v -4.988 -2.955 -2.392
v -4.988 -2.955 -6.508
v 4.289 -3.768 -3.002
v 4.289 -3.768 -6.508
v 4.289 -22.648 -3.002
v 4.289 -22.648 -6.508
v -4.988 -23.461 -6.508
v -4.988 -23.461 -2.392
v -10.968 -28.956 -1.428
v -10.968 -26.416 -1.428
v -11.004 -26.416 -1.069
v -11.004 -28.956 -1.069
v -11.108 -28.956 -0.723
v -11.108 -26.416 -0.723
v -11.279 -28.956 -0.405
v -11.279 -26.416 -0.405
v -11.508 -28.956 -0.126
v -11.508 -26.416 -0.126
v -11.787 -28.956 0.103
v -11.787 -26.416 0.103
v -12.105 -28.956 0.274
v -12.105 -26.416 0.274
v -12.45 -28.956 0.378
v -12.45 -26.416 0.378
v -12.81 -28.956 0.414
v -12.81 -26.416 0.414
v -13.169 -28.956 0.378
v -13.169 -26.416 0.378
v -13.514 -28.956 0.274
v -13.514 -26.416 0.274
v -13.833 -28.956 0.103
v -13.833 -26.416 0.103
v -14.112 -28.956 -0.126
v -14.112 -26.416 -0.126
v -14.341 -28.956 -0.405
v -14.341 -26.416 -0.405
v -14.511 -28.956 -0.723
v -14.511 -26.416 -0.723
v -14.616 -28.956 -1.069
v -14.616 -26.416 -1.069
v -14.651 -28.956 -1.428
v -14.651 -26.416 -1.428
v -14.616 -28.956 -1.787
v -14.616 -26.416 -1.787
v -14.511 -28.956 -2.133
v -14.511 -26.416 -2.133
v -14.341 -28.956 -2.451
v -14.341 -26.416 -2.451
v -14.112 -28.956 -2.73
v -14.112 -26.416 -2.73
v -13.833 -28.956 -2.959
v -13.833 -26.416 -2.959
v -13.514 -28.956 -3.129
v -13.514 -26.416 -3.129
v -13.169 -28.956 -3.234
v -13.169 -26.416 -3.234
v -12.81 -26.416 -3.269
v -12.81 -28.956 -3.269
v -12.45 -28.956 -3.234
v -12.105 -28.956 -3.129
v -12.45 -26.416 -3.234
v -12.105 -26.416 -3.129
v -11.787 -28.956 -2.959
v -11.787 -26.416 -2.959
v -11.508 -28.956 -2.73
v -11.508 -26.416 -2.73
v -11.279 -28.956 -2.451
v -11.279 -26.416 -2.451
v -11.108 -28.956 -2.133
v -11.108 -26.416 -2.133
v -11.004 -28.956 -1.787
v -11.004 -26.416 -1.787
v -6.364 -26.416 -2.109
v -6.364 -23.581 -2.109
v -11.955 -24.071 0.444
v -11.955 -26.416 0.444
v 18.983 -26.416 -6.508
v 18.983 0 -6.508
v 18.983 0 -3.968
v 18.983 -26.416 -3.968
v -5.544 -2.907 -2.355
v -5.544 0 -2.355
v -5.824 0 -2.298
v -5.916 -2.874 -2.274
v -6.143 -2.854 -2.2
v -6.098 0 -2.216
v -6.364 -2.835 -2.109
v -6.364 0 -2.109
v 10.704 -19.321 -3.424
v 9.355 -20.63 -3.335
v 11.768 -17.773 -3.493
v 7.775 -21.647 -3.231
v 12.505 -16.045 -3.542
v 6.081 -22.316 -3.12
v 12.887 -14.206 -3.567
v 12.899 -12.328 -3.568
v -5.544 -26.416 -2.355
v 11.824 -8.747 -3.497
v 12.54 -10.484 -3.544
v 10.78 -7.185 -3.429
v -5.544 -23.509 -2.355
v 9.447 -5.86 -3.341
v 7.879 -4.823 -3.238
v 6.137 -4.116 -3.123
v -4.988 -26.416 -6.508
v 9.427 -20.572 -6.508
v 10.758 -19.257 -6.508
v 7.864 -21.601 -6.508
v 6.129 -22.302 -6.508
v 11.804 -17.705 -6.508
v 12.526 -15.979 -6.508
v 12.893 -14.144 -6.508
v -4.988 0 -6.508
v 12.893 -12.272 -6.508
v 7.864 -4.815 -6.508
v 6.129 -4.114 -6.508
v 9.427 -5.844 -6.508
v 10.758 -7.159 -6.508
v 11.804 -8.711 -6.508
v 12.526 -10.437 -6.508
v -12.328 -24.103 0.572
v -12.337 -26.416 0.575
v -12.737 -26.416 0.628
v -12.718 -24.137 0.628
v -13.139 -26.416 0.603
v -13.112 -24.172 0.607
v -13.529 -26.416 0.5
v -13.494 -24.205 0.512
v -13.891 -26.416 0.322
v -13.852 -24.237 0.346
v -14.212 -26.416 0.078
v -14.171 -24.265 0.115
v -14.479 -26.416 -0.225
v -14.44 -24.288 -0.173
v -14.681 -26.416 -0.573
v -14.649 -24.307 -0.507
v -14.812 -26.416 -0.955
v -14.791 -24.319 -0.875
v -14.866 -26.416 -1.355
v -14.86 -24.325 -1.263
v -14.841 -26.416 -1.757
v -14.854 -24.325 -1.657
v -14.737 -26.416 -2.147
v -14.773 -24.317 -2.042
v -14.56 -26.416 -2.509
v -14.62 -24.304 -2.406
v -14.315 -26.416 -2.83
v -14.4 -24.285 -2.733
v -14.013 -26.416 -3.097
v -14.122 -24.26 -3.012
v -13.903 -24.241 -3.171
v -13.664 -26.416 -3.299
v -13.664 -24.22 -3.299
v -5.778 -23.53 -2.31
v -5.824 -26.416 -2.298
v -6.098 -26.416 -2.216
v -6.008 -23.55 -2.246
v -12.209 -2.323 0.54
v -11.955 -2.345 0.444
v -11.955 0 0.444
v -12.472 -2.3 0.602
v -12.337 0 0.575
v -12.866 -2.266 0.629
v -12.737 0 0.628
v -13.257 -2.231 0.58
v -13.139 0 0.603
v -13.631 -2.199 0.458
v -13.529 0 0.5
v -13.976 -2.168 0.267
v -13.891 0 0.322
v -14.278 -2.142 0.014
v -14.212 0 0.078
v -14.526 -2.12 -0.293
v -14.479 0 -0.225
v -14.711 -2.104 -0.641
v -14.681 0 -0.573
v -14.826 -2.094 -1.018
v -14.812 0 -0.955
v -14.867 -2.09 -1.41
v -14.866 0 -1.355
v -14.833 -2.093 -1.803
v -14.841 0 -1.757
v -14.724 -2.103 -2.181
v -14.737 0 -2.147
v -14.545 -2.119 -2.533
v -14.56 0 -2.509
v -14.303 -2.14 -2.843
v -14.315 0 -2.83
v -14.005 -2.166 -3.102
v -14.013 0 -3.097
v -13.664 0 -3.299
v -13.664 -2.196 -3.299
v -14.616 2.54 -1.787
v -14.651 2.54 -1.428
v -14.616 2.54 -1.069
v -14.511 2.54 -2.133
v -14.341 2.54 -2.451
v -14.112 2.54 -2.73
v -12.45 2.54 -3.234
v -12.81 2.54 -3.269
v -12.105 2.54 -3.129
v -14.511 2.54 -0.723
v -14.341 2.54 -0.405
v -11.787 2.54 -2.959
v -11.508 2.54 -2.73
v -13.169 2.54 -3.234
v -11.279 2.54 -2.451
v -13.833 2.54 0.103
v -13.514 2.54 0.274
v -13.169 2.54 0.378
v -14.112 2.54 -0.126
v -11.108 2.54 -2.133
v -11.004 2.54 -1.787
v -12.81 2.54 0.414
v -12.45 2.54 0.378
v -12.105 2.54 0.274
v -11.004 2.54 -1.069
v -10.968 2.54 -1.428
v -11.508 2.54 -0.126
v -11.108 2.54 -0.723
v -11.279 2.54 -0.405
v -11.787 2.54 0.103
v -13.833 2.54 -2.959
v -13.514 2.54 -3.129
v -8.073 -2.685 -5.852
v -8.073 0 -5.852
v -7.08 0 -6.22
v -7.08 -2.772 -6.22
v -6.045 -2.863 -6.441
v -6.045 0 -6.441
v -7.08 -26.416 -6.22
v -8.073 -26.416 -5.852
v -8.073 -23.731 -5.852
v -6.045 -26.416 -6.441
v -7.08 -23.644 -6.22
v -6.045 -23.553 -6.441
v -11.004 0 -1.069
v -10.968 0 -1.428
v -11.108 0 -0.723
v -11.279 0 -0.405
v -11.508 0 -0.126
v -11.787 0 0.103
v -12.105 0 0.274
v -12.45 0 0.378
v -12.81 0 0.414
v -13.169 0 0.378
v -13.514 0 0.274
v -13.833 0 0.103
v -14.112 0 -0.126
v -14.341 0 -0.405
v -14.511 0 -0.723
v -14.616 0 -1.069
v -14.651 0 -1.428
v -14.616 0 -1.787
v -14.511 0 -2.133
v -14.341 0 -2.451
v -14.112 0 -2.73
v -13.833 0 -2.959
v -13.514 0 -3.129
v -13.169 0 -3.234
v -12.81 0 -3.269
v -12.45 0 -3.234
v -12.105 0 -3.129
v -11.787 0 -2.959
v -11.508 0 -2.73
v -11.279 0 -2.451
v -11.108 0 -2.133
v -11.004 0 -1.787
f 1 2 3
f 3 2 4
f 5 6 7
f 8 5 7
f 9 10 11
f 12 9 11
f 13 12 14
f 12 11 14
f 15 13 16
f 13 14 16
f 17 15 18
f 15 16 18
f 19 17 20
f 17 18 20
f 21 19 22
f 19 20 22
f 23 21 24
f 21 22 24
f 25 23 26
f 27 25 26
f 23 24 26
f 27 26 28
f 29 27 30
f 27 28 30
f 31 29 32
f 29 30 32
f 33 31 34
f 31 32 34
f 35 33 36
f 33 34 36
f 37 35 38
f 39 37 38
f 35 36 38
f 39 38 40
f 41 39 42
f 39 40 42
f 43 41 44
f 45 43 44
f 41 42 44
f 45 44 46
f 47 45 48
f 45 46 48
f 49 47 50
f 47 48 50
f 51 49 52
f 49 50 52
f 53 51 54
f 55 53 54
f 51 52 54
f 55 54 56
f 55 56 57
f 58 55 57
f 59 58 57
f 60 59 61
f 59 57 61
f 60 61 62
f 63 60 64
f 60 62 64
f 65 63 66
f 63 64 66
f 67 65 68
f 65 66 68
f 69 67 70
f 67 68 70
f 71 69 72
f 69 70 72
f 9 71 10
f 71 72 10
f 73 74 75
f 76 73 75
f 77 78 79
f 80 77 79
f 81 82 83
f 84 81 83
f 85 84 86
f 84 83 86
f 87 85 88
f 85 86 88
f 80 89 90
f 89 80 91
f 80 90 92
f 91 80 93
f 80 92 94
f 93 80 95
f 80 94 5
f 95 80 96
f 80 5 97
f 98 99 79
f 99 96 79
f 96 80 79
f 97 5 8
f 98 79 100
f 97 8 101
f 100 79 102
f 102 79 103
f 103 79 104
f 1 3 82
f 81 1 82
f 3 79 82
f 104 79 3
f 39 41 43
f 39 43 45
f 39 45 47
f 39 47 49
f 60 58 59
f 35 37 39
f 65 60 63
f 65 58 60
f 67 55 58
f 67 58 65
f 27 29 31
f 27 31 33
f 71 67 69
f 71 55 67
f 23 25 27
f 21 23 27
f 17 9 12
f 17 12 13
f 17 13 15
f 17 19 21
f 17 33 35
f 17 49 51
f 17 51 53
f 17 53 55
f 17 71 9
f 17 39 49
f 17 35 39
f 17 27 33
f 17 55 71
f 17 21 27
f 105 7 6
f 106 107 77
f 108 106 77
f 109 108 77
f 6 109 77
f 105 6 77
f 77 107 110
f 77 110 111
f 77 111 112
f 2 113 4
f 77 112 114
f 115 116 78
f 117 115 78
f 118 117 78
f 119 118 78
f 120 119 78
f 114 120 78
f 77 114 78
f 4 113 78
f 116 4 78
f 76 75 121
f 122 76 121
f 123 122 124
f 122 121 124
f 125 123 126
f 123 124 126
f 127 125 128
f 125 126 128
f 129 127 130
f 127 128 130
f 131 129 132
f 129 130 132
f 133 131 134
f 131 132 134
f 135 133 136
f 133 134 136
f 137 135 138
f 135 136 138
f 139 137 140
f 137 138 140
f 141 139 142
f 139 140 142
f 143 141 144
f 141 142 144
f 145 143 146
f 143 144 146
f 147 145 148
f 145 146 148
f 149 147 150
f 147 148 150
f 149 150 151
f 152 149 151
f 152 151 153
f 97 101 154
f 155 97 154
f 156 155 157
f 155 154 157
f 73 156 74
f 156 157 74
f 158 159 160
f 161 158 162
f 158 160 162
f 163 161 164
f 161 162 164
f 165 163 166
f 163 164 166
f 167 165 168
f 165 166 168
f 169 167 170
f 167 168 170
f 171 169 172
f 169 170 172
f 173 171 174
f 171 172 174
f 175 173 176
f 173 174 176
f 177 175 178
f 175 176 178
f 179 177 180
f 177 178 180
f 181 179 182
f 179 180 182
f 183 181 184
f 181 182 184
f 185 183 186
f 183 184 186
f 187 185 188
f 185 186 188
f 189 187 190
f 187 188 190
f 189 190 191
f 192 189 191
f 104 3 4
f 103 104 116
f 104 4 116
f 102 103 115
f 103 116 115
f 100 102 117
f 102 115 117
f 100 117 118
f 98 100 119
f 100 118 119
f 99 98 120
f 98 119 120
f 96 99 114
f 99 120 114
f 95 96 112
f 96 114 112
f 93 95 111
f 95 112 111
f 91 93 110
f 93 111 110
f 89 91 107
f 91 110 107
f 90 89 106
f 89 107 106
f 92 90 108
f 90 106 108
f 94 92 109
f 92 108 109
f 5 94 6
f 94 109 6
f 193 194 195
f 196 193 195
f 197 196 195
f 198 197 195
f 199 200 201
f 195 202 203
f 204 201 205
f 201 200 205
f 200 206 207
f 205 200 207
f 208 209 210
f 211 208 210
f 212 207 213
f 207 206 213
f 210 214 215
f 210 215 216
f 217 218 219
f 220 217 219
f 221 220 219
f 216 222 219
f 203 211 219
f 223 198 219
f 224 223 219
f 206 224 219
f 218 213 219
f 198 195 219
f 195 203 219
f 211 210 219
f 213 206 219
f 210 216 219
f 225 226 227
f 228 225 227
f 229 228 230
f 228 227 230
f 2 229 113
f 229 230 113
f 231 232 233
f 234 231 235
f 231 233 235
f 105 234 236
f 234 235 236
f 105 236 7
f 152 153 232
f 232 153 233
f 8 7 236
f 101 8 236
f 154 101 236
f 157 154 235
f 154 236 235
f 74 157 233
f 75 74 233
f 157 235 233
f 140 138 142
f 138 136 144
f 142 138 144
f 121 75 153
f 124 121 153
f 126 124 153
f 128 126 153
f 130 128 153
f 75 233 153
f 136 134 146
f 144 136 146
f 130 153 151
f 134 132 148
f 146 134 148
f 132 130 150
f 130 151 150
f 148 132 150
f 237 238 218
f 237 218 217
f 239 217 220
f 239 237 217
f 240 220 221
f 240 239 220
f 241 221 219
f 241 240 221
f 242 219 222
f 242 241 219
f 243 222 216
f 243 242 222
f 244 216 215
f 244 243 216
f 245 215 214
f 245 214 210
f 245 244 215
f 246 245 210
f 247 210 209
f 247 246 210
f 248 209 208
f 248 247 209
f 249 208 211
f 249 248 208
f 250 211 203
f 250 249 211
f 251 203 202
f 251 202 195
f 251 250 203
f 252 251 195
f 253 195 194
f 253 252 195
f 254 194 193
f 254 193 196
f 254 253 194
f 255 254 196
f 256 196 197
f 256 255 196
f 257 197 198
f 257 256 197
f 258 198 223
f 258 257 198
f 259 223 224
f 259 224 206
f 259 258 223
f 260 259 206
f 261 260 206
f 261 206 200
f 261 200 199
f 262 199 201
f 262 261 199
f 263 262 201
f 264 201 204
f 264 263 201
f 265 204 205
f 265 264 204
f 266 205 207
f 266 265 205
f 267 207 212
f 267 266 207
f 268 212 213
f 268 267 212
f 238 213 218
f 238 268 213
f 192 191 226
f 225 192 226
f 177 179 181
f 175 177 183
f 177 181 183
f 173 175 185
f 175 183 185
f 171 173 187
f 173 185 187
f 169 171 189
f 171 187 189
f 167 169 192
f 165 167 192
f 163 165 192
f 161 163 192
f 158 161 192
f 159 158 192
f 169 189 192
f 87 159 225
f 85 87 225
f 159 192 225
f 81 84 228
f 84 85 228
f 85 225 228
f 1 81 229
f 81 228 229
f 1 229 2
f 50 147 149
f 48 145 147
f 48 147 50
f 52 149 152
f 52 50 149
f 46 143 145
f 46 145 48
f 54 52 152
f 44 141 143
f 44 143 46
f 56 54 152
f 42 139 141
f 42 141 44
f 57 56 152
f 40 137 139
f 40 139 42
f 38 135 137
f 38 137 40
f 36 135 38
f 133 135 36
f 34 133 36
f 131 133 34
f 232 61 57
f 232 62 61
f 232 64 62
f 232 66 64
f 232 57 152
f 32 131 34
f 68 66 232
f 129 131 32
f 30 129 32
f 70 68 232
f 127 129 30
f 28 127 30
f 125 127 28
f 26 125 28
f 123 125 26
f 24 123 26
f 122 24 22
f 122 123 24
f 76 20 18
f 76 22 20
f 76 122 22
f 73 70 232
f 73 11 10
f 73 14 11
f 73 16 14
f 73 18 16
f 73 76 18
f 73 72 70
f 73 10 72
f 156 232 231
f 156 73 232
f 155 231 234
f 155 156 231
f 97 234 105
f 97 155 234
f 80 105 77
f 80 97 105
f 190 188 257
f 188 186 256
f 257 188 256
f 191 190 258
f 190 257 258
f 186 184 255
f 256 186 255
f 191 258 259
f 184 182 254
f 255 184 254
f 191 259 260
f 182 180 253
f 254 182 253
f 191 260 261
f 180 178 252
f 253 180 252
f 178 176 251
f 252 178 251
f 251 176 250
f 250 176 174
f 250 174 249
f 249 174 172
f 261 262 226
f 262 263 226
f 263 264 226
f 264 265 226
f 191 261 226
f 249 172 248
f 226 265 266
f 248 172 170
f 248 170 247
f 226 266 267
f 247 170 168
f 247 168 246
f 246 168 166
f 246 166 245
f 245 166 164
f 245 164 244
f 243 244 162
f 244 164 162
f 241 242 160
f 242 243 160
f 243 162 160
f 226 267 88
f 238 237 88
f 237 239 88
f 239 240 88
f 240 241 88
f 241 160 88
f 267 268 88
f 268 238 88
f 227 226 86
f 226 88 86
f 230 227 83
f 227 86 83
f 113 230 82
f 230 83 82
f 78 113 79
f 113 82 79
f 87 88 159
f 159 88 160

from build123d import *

# Parameters (mm, degrees)
F1_DEPTH = 26.416
F2_R     = 1.8415
F3_DEPTH = 2.54
F7_DEPTH = 7.62


with BuildPart() as f1:
    # F0 (on Front) → F1 (new body)
    with BuildSketch(Plane.XZ):
        with BuildLine():
            Line((-4.9881667079, -6.5078052628), (18.9825711812, -6.5078052628))
            Line((18.9825711812, -6.5078052628), (18.9825711812, -3.9678052628))
            Line((18.9825711812, -3.9678052628), (-5.5439422008, -2.3553312877))
            ThreePointArc((-5.5439422008, -2.3553312877), (-5.9622258253, -2.2601628666), (-6.3636870308, -2.1090102306))
            Line((-6.3636870308, -2.1090102306), (-11.9552752015, 0.4437738695))
            ThreePointArc((-11.9552752015, 0.4437738695), (-14.6813052169, -0.5733543796), (-13.6641769678, -3.299384395))
            Line((-13.6641769678, -3.299384395), (-8.0725887971, -5.8521684951))
            ThreePointArc((-8.0725887971, -5.8521684951), (-6.5663902888, -6.3494066979), (-4.9881667079, -6.5078052628))
        make_face()
    extrude(amount=F1_DEPTH)

    # F2 (on face) → F3 (join)
    with BuildSketch(Plane.XZ.offset(26.416)):
        with Locations((-12.8097260847, -1.4278052628)):
            Circle(F2_R)
    extrude(amount=F3_DEPTH)

    # F5: F1 across plane


with BuildPart() as f1_1:
    add(f1.part)
    add(f1.part.mirror(Plane(origin=(1.3145173971, -13.208, -4.2776395972), x_dir=(1, 0, 0), z_dir=(0, 1, 0))))


with BuildPart() as f7:
    # F6 (on face) → F7 (new body, symmetric)
    with BuildSketch(Plane(origin=(0, 0, -6.5078052628), x_dir=(1, 0, 0), z_dir=(0, 0, -1))):
        Polygon((-4.9881667079, 23.4607403946), (-16.556808725, 24.4735703084), (-16.556808725, 1.9424296916), (-4.9881667079, 2.9552596054), align=None)
        with BuildLine():
            Line((4.2894943617, 22.648484933), (-4.9881667079, 23.4607403946))
            Line((-4.9881667079, 23.4607403946), (-4.9881667079, 2.9552596054))
            Line((-4.9881667079, 2.9552596054), (4.2894943617, 3.767515067))
            ThreePointArc((4.2894943617, 3.767515067), (12.9395799393, 13.208), (4.2894943617, 22.648484933))
        make_face()
    extrude(amount=F7_DEPTH, both=True)


with BuildPart() as f1_2:
    add(f1_1.part)

    # F8: cut F7
    add(f7.part, mode=Mode.SUBTRACT)


solid = f1_2.part
